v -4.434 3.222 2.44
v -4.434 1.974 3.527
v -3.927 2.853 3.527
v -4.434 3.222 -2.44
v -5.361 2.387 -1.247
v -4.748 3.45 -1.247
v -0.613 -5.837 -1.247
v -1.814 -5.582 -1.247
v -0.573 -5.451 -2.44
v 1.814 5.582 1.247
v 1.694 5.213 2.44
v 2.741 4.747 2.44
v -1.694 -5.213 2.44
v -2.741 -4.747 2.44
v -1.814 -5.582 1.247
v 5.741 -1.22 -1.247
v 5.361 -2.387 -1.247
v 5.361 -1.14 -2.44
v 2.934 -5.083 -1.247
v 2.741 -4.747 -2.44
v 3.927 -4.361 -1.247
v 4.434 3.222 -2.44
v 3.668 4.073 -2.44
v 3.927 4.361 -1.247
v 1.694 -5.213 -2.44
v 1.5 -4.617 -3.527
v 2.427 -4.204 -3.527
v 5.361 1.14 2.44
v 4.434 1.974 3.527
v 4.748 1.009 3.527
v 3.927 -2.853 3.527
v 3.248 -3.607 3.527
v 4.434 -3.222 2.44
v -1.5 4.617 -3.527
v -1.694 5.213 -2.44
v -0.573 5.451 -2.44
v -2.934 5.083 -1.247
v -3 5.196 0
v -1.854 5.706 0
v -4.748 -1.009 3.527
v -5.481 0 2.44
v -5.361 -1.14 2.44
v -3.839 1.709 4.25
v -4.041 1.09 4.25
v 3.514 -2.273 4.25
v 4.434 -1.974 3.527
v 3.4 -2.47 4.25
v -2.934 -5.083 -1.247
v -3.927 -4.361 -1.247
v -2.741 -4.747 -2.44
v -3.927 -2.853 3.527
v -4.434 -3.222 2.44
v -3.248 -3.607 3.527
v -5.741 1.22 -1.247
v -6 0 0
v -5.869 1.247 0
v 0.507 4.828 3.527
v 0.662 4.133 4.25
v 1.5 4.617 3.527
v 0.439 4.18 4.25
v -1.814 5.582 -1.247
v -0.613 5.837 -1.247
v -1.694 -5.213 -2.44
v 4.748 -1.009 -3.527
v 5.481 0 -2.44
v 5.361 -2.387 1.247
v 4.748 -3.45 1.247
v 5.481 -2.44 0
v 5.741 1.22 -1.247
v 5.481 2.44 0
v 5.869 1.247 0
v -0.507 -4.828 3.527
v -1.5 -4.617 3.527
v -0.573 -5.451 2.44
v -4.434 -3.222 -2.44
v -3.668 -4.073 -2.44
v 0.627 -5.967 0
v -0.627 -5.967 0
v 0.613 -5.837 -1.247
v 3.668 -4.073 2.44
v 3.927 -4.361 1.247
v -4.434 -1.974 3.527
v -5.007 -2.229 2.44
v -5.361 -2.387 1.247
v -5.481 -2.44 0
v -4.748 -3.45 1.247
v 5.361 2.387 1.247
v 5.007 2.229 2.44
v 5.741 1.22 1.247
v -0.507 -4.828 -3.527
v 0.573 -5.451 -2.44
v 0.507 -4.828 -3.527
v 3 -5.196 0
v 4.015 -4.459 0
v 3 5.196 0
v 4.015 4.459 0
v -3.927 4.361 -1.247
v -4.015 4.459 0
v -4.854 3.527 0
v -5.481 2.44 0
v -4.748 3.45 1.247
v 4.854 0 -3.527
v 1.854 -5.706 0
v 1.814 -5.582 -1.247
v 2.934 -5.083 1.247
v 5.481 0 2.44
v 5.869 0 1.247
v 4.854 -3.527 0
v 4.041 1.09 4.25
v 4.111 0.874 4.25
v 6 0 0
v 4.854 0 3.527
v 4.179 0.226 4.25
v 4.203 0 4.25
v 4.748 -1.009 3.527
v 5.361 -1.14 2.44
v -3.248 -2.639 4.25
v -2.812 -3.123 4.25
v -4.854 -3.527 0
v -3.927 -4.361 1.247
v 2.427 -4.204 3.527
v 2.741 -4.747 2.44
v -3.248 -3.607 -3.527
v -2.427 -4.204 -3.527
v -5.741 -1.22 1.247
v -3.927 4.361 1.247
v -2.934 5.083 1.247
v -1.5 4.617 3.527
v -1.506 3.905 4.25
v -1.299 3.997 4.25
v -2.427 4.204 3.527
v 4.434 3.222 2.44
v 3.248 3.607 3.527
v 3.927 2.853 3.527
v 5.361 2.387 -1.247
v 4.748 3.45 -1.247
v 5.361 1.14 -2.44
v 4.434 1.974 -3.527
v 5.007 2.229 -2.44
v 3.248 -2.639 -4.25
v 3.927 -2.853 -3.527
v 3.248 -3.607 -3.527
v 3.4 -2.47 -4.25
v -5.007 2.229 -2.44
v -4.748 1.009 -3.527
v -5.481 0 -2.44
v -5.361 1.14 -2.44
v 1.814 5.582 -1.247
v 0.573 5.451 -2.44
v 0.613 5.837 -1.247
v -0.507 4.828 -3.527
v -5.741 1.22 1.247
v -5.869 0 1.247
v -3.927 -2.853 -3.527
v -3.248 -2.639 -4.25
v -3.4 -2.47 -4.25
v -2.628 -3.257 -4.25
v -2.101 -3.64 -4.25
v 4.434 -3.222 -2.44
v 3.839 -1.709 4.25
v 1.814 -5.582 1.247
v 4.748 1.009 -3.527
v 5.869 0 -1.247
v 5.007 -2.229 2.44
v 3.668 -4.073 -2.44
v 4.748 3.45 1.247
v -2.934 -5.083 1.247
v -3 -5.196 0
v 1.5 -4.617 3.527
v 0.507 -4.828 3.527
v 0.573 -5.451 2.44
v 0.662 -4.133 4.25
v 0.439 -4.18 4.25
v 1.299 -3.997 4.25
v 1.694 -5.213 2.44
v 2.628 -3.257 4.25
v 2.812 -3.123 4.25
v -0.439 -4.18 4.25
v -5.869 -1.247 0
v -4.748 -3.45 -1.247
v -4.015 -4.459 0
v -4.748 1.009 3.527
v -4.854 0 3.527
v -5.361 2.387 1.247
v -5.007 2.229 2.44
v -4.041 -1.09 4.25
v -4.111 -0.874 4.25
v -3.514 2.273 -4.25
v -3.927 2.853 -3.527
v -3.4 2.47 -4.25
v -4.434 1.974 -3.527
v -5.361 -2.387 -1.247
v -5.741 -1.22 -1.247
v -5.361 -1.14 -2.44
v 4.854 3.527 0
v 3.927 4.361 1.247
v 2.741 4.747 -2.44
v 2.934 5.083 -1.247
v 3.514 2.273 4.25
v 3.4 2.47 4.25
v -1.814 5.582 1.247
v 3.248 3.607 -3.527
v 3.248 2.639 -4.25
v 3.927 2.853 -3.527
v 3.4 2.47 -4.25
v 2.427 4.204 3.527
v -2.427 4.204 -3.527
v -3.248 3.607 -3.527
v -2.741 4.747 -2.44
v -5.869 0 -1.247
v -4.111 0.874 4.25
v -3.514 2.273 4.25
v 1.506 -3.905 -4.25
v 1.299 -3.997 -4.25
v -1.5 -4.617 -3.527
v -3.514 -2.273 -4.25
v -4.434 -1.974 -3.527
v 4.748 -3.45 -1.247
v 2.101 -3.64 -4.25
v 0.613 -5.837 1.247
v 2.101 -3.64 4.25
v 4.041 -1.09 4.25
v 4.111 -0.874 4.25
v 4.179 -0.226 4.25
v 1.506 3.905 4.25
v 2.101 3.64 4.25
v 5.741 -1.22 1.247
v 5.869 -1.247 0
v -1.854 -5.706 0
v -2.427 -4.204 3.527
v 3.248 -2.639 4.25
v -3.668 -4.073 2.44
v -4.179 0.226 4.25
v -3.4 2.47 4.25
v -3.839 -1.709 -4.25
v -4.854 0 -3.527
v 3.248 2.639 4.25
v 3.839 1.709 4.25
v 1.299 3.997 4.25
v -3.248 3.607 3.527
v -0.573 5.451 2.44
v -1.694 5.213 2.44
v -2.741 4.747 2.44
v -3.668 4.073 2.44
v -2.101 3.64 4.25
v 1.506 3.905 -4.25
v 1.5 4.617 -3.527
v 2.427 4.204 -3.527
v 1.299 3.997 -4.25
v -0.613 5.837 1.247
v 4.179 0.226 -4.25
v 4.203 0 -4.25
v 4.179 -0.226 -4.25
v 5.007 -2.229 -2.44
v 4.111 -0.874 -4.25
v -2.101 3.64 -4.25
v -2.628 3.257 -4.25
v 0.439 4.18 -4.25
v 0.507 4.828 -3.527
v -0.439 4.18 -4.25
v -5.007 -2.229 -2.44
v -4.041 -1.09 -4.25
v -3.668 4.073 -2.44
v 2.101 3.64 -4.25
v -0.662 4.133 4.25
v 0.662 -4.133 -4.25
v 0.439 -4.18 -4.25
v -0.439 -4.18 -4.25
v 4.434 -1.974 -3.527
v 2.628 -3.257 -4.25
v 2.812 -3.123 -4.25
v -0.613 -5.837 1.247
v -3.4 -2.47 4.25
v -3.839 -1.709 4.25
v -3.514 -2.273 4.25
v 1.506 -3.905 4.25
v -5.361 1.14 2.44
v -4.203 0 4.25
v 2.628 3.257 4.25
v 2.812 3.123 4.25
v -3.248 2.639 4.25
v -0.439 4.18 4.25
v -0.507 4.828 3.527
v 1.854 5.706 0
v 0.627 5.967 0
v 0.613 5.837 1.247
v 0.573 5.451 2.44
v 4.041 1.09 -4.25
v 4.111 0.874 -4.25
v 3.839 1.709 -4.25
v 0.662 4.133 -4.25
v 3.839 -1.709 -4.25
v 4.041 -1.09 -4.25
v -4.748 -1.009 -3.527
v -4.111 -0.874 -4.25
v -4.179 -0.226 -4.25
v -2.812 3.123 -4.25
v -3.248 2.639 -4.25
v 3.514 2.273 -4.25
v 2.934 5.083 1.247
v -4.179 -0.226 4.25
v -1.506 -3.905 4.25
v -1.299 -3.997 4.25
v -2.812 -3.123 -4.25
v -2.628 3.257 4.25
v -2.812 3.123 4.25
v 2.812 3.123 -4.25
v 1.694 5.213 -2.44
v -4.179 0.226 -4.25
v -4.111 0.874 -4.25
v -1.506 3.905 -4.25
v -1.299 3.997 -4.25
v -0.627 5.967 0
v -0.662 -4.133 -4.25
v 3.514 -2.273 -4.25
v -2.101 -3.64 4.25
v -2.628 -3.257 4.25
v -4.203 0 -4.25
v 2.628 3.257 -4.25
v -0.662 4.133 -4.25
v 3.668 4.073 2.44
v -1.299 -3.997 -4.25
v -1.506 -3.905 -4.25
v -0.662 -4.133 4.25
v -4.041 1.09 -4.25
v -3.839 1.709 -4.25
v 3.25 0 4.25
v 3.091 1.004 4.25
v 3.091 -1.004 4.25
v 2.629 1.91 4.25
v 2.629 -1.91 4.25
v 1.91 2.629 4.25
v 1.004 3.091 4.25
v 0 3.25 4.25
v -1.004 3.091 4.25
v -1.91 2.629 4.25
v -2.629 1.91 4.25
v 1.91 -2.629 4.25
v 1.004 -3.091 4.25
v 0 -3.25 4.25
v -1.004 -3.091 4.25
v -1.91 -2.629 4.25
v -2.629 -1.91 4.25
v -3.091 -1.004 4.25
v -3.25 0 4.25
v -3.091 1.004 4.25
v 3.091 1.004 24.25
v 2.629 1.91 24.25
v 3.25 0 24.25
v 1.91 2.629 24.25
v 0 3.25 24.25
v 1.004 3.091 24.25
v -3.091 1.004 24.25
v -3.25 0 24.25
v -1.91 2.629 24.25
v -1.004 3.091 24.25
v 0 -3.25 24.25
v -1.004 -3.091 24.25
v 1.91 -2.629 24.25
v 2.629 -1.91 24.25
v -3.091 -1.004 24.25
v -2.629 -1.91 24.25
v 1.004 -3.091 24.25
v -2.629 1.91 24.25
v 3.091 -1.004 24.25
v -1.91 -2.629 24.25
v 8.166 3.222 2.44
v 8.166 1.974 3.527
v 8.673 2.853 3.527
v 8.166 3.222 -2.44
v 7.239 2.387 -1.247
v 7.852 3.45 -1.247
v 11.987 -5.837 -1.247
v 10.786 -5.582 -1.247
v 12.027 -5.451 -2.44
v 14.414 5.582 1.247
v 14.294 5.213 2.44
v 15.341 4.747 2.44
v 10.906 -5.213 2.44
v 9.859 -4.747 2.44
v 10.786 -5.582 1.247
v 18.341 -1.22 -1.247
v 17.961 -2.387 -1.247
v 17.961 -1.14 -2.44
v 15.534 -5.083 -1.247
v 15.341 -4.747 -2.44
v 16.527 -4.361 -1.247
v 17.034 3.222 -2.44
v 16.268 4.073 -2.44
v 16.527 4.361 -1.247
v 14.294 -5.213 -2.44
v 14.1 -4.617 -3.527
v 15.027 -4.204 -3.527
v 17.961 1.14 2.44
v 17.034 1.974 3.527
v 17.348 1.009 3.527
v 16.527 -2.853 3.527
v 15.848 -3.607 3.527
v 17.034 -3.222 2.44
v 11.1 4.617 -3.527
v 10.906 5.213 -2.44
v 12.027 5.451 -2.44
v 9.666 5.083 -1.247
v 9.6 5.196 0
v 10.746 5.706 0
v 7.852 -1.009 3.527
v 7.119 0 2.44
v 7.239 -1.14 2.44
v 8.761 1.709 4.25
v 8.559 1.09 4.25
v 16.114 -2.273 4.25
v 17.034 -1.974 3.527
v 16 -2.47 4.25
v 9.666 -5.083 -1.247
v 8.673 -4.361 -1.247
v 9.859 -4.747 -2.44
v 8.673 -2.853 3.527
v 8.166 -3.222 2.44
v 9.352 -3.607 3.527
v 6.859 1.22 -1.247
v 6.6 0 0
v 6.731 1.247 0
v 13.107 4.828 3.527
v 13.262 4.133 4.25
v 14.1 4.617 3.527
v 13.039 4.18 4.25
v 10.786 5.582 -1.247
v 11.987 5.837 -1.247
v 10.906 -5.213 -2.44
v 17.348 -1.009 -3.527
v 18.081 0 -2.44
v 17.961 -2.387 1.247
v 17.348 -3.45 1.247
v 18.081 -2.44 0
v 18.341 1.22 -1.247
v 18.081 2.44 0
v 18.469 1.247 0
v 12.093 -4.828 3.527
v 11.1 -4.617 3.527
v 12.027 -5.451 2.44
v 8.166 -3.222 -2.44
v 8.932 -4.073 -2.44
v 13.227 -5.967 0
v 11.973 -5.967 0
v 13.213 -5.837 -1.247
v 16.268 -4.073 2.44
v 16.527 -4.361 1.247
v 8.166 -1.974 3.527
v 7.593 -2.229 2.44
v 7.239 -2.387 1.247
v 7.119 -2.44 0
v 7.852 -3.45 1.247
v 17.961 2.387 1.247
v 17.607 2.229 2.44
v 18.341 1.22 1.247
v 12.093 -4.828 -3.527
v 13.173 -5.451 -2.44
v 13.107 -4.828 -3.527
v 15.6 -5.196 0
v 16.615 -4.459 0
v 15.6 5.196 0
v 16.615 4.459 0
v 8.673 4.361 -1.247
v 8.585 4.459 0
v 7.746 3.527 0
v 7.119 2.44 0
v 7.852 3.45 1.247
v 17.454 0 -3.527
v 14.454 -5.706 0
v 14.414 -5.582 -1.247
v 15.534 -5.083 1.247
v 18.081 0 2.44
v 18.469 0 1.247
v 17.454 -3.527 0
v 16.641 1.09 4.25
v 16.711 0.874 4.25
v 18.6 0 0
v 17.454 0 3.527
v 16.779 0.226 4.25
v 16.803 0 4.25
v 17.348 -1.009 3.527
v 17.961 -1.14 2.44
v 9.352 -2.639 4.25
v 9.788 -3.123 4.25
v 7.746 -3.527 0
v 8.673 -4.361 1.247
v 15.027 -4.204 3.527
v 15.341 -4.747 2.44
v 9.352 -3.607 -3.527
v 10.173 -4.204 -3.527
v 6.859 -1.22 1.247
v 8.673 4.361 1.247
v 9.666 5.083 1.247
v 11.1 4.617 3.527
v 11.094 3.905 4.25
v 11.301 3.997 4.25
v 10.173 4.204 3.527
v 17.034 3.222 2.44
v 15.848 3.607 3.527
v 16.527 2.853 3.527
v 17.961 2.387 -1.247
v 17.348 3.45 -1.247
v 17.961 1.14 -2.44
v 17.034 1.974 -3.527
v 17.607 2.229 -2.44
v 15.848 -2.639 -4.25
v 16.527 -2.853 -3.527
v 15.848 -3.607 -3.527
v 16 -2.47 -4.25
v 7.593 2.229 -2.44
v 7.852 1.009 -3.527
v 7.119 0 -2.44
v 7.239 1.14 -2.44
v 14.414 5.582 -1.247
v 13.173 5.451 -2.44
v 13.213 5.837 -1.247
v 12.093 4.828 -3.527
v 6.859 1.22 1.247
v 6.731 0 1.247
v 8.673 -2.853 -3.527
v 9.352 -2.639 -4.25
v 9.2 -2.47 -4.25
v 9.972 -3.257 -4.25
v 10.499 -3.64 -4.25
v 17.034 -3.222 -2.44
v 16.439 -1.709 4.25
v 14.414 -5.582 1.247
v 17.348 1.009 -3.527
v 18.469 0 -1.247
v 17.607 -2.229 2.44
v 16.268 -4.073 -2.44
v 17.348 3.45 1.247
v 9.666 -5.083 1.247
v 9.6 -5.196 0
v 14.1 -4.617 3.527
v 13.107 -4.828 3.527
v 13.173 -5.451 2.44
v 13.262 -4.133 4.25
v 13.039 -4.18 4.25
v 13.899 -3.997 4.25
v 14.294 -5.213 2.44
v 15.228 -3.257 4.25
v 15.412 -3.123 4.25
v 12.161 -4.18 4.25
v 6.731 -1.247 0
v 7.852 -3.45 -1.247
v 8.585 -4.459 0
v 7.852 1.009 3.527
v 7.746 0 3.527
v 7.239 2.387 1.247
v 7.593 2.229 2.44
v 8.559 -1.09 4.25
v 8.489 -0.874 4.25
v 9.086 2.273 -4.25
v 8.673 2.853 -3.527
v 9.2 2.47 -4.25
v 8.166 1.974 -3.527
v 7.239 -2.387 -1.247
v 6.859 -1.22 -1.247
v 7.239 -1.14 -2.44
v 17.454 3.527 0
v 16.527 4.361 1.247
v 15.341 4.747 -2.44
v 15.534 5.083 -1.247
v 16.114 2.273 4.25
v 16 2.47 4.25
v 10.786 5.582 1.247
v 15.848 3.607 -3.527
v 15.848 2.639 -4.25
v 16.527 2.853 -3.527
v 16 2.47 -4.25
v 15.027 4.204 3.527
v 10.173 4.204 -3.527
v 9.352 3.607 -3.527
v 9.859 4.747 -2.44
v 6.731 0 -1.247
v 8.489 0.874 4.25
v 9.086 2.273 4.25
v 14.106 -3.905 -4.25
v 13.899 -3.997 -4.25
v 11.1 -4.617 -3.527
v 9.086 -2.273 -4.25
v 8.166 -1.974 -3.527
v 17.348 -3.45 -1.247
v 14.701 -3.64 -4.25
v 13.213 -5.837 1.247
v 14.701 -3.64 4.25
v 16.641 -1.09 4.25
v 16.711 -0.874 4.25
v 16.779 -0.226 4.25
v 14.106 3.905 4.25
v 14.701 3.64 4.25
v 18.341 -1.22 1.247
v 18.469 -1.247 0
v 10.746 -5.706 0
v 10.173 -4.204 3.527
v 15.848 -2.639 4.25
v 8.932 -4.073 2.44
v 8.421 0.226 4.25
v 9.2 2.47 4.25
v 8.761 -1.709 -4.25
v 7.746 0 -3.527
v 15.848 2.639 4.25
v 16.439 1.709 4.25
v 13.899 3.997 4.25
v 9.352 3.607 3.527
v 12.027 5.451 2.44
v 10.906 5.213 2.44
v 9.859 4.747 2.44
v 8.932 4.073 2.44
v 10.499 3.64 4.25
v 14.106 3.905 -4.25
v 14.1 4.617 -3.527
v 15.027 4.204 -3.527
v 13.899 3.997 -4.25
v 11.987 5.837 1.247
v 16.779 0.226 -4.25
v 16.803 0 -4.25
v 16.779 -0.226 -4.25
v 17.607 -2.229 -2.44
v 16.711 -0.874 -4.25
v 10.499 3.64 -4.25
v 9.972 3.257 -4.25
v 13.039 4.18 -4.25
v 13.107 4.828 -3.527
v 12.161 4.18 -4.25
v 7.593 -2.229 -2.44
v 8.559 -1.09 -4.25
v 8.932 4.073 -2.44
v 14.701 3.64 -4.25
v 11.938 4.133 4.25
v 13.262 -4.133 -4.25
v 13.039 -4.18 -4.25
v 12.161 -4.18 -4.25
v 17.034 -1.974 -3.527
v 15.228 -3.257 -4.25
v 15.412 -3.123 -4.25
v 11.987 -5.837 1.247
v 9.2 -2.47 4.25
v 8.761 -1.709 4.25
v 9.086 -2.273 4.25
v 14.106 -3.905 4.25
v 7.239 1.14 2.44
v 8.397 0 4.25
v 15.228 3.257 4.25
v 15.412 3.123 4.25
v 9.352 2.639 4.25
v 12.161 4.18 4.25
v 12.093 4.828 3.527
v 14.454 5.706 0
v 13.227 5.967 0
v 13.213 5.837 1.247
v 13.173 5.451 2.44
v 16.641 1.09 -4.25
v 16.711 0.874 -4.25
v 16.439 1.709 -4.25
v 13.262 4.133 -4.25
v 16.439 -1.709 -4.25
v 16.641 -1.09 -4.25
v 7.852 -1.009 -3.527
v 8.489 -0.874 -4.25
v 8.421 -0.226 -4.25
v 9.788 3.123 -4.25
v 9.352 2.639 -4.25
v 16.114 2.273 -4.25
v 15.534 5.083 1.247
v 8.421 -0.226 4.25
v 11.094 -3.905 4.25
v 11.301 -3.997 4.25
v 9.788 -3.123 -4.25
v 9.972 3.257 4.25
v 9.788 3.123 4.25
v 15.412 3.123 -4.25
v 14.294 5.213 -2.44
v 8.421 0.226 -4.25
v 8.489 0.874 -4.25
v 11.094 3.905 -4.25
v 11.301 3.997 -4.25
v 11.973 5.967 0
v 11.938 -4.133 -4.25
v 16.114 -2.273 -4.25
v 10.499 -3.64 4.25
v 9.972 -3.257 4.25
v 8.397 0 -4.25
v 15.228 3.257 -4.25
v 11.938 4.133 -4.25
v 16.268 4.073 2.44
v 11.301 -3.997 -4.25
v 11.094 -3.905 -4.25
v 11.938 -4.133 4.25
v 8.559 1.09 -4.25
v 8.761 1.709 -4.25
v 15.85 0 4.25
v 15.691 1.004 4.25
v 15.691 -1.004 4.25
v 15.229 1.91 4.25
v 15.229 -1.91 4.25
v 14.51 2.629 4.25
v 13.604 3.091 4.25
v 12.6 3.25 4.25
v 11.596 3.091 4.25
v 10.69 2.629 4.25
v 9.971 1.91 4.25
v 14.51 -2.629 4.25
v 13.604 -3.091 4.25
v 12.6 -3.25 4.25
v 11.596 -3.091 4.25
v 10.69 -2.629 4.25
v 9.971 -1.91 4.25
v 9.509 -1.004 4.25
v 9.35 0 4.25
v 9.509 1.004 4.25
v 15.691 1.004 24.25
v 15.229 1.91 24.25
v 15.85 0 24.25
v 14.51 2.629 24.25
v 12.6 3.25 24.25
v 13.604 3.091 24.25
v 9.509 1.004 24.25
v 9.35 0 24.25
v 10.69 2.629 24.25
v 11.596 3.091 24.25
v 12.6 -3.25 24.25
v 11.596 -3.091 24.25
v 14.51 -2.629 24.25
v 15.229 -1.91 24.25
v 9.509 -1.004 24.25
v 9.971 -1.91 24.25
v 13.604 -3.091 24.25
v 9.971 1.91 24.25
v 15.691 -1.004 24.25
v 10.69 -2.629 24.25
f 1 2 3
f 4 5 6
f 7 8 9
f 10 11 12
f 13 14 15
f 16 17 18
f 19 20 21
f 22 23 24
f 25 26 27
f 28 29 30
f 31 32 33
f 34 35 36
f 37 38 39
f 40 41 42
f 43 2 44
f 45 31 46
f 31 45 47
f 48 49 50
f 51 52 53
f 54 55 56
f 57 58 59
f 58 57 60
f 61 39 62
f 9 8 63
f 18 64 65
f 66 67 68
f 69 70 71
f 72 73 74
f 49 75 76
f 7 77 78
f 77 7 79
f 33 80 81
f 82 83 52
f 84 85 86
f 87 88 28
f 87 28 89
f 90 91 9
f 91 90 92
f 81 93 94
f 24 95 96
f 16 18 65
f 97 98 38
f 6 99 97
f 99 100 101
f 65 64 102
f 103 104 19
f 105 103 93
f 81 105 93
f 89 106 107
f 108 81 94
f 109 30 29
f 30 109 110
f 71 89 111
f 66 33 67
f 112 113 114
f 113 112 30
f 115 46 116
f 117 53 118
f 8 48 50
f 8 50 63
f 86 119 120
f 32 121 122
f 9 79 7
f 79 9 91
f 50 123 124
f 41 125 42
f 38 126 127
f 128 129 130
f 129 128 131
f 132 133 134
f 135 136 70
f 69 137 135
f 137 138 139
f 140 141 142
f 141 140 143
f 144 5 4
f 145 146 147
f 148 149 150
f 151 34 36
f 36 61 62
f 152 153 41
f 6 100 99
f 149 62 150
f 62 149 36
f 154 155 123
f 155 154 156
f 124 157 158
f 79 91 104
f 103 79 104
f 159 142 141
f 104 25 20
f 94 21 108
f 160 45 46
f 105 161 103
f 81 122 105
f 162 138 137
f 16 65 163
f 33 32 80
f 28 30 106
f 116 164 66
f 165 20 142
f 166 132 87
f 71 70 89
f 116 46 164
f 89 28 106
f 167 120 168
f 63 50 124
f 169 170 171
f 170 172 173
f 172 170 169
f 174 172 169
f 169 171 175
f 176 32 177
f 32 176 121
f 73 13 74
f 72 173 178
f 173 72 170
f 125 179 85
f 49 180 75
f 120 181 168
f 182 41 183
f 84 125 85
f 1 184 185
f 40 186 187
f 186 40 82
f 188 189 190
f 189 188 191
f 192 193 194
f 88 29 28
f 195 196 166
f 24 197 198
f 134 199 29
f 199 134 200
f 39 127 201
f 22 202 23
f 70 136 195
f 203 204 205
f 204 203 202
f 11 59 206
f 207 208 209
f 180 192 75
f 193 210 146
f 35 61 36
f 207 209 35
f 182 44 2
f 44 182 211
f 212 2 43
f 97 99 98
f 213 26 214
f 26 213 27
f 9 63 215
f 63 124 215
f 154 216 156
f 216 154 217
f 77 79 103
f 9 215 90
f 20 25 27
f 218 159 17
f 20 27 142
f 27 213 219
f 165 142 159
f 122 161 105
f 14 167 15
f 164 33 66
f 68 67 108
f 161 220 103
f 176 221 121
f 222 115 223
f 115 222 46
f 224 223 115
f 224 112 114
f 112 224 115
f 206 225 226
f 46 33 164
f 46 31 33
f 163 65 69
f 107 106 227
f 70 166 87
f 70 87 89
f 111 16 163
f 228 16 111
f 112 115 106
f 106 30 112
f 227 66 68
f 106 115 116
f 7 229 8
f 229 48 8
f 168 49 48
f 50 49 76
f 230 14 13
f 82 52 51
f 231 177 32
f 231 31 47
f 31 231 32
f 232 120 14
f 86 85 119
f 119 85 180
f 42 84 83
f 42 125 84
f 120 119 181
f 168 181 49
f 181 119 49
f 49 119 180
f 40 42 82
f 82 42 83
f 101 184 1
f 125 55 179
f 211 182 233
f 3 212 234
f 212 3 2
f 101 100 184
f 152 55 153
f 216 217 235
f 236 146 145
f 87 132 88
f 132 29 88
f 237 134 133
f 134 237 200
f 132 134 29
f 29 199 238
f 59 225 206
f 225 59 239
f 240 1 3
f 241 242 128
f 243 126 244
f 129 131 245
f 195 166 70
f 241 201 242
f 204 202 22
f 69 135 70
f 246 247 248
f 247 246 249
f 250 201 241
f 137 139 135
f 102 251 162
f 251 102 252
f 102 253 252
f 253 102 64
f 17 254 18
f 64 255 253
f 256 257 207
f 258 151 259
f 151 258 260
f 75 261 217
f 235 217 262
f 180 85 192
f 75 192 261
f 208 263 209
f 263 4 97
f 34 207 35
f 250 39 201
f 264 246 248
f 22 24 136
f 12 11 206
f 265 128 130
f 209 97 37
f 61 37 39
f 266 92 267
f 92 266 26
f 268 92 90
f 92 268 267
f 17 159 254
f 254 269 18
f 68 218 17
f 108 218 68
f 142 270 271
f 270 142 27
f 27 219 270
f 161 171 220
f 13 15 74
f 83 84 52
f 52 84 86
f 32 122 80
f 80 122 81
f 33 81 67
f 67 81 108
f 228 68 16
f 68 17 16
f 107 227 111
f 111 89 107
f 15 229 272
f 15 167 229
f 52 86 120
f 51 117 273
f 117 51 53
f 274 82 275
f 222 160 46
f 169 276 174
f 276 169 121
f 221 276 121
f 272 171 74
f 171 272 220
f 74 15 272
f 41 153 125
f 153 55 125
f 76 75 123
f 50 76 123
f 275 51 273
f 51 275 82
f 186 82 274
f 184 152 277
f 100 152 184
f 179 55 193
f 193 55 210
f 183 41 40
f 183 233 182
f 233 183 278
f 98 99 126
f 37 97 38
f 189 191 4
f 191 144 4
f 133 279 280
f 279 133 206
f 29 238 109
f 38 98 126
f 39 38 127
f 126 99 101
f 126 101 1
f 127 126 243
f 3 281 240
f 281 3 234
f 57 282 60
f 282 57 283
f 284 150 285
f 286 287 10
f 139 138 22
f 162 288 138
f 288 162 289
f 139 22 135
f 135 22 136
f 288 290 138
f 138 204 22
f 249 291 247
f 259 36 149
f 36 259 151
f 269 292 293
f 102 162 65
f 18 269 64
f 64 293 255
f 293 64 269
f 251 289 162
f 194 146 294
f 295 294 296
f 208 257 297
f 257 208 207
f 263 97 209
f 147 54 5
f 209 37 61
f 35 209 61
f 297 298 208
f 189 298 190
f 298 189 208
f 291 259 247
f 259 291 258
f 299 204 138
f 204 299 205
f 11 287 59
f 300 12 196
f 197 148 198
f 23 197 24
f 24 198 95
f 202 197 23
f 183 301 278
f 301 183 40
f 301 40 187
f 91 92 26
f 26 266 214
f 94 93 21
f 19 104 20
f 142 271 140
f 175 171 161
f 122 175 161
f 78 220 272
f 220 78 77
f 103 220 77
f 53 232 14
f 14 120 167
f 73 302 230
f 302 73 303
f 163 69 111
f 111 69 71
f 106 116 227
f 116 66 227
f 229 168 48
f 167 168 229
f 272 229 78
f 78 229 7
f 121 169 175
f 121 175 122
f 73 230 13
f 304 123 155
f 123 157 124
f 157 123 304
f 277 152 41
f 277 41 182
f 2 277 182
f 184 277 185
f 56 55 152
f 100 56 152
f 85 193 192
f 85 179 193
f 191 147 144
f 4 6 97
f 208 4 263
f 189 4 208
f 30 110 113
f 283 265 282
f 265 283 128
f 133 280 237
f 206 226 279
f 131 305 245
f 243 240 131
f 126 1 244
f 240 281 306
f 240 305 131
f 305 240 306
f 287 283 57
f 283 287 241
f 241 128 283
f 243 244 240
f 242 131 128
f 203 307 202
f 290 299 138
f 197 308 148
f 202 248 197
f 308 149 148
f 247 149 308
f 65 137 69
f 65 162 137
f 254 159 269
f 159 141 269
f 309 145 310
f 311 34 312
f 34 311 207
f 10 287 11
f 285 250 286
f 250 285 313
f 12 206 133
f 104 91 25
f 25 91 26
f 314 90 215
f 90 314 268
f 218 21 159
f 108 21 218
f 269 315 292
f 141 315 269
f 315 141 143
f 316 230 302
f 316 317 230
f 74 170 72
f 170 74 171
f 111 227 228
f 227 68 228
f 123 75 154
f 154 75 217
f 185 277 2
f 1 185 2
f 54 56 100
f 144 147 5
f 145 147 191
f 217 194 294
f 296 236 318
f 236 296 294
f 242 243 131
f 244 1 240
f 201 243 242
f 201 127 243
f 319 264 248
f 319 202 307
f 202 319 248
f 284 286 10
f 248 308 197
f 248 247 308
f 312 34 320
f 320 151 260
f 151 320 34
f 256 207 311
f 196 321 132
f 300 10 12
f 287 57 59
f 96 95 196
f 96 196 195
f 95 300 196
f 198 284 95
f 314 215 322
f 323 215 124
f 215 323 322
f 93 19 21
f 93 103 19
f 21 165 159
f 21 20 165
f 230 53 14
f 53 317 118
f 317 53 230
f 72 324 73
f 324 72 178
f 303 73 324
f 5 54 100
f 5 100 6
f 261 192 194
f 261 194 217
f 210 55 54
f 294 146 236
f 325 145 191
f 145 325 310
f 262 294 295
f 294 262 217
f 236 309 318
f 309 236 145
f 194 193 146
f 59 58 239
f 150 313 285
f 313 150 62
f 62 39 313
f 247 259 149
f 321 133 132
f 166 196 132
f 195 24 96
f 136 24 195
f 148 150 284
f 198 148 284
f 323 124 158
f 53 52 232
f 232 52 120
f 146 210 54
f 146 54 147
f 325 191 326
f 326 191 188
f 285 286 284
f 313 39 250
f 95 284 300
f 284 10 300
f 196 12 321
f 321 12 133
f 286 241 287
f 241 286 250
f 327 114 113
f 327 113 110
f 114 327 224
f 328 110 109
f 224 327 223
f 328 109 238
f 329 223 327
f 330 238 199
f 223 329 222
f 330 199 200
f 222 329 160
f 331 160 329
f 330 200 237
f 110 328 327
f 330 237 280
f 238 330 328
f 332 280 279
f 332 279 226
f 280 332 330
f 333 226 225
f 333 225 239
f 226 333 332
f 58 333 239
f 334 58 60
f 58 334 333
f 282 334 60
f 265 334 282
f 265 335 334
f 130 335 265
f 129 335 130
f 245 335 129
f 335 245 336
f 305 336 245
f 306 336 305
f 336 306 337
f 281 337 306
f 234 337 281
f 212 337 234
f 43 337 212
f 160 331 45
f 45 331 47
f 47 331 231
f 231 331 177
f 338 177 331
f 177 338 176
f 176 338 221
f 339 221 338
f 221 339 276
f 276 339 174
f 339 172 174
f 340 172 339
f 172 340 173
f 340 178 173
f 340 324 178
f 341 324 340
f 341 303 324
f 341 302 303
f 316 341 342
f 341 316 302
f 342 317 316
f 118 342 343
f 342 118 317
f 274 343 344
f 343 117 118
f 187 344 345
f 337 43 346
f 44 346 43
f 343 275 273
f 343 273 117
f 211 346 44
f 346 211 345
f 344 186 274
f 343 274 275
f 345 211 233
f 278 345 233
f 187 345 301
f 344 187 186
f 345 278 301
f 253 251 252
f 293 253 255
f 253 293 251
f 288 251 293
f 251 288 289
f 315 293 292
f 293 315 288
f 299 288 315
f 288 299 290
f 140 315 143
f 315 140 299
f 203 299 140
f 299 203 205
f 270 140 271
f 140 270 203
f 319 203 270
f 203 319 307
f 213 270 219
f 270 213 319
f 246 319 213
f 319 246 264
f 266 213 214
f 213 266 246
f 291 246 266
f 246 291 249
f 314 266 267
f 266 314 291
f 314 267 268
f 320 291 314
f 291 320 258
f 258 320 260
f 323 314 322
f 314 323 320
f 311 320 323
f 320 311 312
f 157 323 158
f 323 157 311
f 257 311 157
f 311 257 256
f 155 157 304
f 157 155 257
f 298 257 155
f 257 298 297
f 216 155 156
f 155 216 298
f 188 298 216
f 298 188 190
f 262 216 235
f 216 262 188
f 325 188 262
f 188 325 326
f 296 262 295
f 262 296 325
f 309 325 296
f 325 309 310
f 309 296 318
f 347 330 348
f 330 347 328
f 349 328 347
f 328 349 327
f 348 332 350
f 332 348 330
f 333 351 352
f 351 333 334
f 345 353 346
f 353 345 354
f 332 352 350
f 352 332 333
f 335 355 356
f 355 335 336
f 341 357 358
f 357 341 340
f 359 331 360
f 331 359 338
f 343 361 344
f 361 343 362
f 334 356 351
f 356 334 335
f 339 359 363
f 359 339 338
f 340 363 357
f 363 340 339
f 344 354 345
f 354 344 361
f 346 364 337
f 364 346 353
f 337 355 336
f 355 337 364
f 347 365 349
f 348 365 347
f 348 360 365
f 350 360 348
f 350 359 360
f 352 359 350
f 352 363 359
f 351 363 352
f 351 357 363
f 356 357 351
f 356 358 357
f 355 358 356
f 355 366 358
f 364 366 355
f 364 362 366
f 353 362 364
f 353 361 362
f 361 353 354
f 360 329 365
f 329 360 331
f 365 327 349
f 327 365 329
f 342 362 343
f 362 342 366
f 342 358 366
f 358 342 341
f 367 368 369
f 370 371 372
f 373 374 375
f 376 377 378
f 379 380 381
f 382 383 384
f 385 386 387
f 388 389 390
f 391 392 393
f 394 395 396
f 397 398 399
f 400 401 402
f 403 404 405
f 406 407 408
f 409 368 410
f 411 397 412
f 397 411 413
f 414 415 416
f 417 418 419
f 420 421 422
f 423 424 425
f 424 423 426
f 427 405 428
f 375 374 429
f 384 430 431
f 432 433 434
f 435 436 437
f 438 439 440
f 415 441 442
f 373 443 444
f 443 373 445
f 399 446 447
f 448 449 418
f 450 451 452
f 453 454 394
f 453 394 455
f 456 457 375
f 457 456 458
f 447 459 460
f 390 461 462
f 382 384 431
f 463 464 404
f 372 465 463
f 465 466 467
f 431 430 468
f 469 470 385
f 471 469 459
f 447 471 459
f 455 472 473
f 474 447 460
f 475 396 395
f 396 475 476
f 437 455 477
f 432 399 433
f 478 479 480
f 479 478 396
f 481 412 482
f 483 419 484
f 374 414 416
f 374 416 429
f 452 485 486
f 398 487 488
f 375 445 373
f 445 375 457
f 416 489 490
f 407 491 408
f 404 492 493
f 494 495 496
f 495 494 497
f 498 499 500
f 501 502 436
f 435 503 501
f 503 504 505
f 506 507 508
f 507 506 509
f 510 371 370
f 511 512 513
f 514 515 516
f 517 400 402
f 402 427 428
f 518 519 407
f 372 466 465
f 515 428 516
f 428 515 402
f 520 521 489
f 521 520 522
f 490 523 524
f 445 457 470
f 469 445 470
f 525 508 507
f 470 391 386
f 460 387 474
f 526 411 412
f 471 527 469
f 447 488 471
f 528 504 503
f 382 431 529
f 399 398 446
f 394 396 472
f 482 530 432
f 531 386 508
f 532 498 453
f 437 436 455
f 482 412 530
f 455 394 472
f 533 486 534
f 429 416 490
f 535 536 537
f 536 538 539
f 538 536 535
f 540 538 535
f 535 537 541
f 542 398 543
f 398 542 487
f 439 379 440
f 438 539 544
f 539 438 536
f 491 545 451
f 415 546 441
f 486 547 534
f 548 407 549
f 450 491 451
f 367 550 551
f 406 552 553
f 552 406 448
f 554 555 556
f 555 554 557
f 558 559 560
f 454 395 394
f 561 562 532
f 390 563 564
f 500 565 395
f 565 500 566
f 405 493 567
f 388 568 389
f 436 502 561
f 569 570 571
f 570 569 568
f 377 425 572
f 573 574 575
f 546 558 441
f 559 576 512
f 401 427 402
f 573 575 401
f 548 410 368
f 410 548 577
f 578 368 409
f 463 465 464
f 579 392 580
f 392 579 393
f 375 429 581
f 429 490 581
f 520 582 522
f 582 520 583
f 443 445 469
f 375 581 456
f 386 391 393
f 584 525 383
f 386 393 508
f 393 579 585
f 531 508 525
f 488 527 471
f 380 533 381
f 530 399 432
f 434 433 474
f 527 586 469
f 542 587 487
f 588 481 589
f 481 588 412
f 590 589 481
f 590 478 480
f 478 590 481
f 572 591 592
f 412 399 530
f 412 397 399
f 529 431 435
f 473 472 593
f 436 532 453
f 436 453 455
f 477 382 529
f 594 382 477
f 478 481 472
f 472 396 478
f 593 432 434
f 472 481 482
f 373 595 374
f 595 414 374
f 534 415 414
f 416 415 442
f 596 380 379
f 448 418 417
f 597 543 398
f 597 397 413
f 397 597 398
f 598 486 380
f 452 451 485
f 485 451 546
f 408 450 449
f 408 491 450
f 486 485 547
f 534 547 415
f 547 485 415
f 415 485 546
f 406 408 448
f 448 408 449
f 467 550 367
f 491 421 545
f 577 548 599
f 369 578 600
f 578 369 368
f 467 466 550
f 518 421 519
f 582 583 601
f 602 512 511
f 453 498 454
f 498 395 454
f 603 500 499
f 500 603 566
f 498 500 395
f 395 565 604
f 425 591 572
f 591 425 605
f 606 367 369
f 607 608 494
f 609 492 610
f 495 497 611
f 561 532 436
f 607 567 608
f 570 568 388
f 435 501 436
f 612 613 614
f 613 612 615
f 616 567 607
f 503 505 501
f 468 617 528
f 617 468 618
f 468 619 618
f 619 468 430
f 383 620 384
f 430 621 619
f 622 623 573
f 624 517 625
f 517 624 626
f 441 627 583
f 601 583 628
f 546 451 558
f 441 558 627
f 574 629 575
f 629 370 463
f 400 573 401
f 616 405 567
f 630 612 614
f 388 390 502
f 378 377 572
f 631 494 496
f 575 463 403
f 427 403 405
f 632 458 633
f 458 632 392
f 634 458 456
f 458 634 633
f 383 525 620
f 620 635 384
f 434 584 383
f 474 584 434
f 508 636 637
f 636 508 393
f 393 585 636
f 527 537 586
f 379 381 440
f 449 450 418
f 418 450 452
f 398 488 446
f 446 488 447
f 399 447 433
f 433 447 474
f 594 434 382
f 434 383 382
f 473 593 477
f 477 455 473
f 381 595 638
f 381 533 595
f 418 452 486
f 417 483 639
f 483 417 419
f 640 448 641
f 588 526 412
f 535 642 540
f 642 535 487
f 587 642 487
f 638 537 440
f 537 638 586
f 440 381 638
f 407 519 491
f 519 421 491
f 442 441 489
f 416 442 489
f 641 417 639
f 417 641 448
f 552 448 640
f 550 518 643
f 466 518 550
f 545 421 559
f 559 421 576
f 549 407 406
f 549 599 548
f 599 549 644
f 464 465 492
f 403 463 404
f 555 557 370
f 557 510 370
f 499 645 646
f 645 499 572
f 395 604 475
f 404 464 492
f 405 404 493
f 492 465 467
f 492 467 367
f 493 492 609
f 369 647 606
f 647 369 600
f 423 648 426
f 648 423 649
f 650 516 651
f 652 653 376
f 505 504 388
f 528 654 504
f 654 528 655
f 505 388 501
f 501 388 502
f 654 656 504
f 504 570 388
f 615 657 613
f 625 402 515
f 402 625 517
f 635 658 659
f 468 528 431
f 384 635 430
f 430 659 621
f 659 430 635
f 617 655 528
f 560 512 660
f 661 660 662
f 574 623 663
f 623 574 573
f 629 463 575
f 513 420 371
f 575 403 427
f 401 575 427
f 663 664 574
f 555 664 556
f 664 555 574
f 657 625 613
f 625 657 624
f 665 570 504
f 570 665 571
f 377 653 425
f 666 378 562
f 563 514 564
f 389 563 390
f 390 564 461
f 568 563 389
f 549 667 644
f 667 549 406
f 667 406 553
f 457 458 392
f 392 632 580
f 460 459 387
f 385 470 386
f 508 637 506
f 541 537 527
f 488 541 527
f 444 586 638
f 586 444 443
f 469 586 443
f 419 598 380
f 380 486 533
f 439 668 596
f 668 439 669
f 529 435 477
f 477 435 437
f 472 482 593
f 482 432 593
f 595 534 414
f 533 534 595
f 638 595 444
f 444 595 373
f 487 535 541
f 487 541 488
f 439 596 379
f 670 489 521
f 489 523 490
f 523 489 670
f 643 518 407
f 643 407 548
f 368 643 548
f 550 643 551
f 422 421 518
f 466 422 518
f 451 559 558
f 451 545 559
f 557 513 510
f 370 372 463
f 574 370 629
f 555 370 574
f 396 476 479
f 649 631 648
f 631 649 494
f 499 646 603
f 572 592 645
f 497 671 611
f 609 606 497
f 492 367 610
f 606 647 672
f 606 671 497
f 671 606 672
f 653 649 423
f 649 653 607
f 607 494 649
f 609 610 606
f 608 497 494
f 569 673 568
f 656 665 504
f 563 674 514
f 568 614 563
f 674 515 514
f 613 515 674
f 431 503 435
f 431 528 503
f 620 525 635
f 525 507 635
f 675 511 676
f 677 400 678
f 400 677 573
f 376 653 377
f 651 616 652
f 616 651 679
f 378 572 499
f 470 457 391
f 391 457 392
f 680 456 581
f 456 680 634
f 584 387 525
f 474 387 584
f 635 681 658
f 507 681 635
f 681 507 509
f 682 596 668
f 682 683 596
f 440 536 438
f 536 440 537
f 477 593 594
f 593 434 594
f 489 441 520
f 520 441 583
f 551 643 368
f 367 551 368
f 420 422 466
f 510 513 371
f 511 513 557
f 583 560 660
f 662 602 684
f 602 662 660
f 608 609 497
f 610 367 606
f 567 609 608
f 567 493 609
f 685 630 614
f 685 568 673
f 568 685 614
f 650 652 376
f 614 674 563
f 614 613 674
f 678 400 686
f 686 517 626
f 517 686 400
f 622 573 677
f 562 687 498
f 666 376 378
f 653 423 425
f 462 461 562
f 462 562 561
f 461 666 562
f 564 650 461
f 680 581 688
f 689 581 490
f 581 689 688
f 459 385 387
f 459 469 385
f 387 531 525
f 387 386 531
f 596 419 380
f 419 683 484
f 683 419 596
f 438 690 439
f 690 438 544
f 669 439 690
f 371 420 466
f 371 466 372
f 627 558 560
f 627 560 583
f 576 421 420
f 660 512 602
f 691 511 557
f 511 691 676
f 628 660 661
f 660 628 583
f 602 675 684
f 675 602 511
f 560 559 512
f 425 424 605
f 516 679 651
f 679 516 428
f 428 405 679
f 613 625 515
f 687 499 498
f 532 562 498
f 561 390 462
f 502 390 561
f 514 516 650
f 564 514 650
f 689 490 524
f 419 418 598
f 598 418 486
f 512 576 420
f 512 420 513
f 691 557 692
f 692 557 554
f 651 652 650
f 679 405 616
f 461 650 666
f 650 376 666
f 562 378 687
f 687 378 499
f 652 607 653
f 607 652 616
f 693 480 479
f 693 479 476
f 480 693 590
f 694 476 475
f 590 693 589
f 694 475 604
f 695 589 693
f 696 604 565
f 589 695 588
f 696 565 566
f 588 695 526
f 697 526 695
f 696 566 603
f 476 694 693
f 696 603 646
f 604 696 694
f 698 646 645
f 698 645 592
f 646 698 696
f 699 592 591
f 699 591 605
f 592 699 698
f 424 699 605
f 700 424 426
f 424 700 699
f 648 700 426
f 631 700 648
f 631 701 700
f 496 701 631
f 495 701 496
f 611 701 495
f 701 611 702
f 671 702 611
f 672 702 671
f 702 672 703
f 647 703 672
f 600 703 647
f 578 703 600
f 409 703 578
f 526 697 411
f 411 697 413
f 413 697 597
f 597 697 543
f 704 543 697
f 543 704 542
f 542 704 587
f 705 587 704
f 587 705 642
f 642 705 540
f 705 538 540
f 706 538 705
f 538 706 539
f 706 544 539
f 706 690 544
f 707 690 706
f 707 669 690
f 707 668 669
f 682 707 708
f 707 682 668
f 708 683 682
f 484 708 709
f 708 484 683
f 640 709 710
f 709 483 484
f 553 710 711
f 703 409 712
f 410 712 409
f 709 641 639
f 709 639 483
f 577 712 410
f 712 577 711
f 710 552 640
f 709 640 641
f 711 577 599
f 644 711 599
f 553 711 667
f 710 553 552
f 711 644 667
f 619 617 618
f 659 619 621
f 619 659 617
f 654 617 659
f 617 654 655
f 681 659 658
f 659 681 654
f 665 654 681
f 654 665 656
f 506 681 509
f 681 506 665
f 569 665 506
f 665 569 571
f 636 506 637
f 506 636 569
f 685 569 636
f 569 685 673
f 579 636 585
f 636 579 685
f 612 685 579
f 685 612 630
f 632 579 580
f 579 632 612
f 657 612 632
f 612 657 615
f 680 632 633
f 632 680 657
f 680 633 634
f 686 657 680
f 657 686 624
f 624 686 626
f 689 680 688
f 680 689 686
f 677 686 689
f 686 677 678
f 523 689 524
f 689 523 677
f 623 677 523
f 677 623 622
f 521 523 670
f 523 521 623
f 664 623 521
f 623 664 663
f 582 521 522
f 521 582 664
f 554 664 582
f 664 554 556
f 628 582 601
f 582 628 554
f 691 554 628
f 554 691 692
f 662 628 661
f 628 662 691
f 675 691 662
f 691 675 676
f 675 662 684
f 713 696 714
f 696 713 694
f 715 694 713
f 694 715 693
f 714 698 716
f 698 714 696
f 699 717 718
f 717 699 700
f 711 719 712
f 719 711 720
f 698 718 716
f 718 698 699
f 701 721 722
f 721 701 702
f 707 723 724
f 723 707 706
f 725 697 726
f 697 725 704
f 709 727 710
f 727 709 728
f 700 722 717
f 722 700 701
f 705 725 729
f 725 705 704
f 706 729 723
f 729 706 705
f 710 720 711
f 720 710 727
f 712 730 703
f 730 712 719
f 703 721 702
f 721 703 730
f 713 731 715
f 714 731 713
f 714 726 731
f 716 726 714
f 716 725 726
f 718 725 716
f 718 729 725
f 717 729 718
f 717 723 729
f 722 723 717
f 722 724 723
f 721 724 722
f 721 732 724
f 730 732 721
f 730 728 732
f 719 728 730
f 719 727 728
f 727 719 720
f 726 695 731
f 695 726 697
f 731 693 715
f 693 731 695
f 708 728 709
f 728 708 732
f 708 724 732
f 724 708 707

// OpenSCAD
// Sphere diam	 12.0mm (.47")
// Sphere chop	  8.5mm (.33")
// Stem diam	  6.0mm (.24")
// Stem length	 20.0mm (.79")

rs = 12.0/2;
hs = 8.5;

rc = 6.0/2;
hc = 20.0 + hs/2;

// the cylinder diameter is measuring about 0.5mm short of 6mm

rc = 6.5/2;

module coupler() {
    intersection() {
        sphere(r=rs, $fn=30);
        cube([2*rs, 2*rs, hs], true);
    }
    cylinder(hc, rc, rc, $fn=20);
} 

for(x=[0:1])
    translate([2.1*rs*x,0,0])
        coupler();
